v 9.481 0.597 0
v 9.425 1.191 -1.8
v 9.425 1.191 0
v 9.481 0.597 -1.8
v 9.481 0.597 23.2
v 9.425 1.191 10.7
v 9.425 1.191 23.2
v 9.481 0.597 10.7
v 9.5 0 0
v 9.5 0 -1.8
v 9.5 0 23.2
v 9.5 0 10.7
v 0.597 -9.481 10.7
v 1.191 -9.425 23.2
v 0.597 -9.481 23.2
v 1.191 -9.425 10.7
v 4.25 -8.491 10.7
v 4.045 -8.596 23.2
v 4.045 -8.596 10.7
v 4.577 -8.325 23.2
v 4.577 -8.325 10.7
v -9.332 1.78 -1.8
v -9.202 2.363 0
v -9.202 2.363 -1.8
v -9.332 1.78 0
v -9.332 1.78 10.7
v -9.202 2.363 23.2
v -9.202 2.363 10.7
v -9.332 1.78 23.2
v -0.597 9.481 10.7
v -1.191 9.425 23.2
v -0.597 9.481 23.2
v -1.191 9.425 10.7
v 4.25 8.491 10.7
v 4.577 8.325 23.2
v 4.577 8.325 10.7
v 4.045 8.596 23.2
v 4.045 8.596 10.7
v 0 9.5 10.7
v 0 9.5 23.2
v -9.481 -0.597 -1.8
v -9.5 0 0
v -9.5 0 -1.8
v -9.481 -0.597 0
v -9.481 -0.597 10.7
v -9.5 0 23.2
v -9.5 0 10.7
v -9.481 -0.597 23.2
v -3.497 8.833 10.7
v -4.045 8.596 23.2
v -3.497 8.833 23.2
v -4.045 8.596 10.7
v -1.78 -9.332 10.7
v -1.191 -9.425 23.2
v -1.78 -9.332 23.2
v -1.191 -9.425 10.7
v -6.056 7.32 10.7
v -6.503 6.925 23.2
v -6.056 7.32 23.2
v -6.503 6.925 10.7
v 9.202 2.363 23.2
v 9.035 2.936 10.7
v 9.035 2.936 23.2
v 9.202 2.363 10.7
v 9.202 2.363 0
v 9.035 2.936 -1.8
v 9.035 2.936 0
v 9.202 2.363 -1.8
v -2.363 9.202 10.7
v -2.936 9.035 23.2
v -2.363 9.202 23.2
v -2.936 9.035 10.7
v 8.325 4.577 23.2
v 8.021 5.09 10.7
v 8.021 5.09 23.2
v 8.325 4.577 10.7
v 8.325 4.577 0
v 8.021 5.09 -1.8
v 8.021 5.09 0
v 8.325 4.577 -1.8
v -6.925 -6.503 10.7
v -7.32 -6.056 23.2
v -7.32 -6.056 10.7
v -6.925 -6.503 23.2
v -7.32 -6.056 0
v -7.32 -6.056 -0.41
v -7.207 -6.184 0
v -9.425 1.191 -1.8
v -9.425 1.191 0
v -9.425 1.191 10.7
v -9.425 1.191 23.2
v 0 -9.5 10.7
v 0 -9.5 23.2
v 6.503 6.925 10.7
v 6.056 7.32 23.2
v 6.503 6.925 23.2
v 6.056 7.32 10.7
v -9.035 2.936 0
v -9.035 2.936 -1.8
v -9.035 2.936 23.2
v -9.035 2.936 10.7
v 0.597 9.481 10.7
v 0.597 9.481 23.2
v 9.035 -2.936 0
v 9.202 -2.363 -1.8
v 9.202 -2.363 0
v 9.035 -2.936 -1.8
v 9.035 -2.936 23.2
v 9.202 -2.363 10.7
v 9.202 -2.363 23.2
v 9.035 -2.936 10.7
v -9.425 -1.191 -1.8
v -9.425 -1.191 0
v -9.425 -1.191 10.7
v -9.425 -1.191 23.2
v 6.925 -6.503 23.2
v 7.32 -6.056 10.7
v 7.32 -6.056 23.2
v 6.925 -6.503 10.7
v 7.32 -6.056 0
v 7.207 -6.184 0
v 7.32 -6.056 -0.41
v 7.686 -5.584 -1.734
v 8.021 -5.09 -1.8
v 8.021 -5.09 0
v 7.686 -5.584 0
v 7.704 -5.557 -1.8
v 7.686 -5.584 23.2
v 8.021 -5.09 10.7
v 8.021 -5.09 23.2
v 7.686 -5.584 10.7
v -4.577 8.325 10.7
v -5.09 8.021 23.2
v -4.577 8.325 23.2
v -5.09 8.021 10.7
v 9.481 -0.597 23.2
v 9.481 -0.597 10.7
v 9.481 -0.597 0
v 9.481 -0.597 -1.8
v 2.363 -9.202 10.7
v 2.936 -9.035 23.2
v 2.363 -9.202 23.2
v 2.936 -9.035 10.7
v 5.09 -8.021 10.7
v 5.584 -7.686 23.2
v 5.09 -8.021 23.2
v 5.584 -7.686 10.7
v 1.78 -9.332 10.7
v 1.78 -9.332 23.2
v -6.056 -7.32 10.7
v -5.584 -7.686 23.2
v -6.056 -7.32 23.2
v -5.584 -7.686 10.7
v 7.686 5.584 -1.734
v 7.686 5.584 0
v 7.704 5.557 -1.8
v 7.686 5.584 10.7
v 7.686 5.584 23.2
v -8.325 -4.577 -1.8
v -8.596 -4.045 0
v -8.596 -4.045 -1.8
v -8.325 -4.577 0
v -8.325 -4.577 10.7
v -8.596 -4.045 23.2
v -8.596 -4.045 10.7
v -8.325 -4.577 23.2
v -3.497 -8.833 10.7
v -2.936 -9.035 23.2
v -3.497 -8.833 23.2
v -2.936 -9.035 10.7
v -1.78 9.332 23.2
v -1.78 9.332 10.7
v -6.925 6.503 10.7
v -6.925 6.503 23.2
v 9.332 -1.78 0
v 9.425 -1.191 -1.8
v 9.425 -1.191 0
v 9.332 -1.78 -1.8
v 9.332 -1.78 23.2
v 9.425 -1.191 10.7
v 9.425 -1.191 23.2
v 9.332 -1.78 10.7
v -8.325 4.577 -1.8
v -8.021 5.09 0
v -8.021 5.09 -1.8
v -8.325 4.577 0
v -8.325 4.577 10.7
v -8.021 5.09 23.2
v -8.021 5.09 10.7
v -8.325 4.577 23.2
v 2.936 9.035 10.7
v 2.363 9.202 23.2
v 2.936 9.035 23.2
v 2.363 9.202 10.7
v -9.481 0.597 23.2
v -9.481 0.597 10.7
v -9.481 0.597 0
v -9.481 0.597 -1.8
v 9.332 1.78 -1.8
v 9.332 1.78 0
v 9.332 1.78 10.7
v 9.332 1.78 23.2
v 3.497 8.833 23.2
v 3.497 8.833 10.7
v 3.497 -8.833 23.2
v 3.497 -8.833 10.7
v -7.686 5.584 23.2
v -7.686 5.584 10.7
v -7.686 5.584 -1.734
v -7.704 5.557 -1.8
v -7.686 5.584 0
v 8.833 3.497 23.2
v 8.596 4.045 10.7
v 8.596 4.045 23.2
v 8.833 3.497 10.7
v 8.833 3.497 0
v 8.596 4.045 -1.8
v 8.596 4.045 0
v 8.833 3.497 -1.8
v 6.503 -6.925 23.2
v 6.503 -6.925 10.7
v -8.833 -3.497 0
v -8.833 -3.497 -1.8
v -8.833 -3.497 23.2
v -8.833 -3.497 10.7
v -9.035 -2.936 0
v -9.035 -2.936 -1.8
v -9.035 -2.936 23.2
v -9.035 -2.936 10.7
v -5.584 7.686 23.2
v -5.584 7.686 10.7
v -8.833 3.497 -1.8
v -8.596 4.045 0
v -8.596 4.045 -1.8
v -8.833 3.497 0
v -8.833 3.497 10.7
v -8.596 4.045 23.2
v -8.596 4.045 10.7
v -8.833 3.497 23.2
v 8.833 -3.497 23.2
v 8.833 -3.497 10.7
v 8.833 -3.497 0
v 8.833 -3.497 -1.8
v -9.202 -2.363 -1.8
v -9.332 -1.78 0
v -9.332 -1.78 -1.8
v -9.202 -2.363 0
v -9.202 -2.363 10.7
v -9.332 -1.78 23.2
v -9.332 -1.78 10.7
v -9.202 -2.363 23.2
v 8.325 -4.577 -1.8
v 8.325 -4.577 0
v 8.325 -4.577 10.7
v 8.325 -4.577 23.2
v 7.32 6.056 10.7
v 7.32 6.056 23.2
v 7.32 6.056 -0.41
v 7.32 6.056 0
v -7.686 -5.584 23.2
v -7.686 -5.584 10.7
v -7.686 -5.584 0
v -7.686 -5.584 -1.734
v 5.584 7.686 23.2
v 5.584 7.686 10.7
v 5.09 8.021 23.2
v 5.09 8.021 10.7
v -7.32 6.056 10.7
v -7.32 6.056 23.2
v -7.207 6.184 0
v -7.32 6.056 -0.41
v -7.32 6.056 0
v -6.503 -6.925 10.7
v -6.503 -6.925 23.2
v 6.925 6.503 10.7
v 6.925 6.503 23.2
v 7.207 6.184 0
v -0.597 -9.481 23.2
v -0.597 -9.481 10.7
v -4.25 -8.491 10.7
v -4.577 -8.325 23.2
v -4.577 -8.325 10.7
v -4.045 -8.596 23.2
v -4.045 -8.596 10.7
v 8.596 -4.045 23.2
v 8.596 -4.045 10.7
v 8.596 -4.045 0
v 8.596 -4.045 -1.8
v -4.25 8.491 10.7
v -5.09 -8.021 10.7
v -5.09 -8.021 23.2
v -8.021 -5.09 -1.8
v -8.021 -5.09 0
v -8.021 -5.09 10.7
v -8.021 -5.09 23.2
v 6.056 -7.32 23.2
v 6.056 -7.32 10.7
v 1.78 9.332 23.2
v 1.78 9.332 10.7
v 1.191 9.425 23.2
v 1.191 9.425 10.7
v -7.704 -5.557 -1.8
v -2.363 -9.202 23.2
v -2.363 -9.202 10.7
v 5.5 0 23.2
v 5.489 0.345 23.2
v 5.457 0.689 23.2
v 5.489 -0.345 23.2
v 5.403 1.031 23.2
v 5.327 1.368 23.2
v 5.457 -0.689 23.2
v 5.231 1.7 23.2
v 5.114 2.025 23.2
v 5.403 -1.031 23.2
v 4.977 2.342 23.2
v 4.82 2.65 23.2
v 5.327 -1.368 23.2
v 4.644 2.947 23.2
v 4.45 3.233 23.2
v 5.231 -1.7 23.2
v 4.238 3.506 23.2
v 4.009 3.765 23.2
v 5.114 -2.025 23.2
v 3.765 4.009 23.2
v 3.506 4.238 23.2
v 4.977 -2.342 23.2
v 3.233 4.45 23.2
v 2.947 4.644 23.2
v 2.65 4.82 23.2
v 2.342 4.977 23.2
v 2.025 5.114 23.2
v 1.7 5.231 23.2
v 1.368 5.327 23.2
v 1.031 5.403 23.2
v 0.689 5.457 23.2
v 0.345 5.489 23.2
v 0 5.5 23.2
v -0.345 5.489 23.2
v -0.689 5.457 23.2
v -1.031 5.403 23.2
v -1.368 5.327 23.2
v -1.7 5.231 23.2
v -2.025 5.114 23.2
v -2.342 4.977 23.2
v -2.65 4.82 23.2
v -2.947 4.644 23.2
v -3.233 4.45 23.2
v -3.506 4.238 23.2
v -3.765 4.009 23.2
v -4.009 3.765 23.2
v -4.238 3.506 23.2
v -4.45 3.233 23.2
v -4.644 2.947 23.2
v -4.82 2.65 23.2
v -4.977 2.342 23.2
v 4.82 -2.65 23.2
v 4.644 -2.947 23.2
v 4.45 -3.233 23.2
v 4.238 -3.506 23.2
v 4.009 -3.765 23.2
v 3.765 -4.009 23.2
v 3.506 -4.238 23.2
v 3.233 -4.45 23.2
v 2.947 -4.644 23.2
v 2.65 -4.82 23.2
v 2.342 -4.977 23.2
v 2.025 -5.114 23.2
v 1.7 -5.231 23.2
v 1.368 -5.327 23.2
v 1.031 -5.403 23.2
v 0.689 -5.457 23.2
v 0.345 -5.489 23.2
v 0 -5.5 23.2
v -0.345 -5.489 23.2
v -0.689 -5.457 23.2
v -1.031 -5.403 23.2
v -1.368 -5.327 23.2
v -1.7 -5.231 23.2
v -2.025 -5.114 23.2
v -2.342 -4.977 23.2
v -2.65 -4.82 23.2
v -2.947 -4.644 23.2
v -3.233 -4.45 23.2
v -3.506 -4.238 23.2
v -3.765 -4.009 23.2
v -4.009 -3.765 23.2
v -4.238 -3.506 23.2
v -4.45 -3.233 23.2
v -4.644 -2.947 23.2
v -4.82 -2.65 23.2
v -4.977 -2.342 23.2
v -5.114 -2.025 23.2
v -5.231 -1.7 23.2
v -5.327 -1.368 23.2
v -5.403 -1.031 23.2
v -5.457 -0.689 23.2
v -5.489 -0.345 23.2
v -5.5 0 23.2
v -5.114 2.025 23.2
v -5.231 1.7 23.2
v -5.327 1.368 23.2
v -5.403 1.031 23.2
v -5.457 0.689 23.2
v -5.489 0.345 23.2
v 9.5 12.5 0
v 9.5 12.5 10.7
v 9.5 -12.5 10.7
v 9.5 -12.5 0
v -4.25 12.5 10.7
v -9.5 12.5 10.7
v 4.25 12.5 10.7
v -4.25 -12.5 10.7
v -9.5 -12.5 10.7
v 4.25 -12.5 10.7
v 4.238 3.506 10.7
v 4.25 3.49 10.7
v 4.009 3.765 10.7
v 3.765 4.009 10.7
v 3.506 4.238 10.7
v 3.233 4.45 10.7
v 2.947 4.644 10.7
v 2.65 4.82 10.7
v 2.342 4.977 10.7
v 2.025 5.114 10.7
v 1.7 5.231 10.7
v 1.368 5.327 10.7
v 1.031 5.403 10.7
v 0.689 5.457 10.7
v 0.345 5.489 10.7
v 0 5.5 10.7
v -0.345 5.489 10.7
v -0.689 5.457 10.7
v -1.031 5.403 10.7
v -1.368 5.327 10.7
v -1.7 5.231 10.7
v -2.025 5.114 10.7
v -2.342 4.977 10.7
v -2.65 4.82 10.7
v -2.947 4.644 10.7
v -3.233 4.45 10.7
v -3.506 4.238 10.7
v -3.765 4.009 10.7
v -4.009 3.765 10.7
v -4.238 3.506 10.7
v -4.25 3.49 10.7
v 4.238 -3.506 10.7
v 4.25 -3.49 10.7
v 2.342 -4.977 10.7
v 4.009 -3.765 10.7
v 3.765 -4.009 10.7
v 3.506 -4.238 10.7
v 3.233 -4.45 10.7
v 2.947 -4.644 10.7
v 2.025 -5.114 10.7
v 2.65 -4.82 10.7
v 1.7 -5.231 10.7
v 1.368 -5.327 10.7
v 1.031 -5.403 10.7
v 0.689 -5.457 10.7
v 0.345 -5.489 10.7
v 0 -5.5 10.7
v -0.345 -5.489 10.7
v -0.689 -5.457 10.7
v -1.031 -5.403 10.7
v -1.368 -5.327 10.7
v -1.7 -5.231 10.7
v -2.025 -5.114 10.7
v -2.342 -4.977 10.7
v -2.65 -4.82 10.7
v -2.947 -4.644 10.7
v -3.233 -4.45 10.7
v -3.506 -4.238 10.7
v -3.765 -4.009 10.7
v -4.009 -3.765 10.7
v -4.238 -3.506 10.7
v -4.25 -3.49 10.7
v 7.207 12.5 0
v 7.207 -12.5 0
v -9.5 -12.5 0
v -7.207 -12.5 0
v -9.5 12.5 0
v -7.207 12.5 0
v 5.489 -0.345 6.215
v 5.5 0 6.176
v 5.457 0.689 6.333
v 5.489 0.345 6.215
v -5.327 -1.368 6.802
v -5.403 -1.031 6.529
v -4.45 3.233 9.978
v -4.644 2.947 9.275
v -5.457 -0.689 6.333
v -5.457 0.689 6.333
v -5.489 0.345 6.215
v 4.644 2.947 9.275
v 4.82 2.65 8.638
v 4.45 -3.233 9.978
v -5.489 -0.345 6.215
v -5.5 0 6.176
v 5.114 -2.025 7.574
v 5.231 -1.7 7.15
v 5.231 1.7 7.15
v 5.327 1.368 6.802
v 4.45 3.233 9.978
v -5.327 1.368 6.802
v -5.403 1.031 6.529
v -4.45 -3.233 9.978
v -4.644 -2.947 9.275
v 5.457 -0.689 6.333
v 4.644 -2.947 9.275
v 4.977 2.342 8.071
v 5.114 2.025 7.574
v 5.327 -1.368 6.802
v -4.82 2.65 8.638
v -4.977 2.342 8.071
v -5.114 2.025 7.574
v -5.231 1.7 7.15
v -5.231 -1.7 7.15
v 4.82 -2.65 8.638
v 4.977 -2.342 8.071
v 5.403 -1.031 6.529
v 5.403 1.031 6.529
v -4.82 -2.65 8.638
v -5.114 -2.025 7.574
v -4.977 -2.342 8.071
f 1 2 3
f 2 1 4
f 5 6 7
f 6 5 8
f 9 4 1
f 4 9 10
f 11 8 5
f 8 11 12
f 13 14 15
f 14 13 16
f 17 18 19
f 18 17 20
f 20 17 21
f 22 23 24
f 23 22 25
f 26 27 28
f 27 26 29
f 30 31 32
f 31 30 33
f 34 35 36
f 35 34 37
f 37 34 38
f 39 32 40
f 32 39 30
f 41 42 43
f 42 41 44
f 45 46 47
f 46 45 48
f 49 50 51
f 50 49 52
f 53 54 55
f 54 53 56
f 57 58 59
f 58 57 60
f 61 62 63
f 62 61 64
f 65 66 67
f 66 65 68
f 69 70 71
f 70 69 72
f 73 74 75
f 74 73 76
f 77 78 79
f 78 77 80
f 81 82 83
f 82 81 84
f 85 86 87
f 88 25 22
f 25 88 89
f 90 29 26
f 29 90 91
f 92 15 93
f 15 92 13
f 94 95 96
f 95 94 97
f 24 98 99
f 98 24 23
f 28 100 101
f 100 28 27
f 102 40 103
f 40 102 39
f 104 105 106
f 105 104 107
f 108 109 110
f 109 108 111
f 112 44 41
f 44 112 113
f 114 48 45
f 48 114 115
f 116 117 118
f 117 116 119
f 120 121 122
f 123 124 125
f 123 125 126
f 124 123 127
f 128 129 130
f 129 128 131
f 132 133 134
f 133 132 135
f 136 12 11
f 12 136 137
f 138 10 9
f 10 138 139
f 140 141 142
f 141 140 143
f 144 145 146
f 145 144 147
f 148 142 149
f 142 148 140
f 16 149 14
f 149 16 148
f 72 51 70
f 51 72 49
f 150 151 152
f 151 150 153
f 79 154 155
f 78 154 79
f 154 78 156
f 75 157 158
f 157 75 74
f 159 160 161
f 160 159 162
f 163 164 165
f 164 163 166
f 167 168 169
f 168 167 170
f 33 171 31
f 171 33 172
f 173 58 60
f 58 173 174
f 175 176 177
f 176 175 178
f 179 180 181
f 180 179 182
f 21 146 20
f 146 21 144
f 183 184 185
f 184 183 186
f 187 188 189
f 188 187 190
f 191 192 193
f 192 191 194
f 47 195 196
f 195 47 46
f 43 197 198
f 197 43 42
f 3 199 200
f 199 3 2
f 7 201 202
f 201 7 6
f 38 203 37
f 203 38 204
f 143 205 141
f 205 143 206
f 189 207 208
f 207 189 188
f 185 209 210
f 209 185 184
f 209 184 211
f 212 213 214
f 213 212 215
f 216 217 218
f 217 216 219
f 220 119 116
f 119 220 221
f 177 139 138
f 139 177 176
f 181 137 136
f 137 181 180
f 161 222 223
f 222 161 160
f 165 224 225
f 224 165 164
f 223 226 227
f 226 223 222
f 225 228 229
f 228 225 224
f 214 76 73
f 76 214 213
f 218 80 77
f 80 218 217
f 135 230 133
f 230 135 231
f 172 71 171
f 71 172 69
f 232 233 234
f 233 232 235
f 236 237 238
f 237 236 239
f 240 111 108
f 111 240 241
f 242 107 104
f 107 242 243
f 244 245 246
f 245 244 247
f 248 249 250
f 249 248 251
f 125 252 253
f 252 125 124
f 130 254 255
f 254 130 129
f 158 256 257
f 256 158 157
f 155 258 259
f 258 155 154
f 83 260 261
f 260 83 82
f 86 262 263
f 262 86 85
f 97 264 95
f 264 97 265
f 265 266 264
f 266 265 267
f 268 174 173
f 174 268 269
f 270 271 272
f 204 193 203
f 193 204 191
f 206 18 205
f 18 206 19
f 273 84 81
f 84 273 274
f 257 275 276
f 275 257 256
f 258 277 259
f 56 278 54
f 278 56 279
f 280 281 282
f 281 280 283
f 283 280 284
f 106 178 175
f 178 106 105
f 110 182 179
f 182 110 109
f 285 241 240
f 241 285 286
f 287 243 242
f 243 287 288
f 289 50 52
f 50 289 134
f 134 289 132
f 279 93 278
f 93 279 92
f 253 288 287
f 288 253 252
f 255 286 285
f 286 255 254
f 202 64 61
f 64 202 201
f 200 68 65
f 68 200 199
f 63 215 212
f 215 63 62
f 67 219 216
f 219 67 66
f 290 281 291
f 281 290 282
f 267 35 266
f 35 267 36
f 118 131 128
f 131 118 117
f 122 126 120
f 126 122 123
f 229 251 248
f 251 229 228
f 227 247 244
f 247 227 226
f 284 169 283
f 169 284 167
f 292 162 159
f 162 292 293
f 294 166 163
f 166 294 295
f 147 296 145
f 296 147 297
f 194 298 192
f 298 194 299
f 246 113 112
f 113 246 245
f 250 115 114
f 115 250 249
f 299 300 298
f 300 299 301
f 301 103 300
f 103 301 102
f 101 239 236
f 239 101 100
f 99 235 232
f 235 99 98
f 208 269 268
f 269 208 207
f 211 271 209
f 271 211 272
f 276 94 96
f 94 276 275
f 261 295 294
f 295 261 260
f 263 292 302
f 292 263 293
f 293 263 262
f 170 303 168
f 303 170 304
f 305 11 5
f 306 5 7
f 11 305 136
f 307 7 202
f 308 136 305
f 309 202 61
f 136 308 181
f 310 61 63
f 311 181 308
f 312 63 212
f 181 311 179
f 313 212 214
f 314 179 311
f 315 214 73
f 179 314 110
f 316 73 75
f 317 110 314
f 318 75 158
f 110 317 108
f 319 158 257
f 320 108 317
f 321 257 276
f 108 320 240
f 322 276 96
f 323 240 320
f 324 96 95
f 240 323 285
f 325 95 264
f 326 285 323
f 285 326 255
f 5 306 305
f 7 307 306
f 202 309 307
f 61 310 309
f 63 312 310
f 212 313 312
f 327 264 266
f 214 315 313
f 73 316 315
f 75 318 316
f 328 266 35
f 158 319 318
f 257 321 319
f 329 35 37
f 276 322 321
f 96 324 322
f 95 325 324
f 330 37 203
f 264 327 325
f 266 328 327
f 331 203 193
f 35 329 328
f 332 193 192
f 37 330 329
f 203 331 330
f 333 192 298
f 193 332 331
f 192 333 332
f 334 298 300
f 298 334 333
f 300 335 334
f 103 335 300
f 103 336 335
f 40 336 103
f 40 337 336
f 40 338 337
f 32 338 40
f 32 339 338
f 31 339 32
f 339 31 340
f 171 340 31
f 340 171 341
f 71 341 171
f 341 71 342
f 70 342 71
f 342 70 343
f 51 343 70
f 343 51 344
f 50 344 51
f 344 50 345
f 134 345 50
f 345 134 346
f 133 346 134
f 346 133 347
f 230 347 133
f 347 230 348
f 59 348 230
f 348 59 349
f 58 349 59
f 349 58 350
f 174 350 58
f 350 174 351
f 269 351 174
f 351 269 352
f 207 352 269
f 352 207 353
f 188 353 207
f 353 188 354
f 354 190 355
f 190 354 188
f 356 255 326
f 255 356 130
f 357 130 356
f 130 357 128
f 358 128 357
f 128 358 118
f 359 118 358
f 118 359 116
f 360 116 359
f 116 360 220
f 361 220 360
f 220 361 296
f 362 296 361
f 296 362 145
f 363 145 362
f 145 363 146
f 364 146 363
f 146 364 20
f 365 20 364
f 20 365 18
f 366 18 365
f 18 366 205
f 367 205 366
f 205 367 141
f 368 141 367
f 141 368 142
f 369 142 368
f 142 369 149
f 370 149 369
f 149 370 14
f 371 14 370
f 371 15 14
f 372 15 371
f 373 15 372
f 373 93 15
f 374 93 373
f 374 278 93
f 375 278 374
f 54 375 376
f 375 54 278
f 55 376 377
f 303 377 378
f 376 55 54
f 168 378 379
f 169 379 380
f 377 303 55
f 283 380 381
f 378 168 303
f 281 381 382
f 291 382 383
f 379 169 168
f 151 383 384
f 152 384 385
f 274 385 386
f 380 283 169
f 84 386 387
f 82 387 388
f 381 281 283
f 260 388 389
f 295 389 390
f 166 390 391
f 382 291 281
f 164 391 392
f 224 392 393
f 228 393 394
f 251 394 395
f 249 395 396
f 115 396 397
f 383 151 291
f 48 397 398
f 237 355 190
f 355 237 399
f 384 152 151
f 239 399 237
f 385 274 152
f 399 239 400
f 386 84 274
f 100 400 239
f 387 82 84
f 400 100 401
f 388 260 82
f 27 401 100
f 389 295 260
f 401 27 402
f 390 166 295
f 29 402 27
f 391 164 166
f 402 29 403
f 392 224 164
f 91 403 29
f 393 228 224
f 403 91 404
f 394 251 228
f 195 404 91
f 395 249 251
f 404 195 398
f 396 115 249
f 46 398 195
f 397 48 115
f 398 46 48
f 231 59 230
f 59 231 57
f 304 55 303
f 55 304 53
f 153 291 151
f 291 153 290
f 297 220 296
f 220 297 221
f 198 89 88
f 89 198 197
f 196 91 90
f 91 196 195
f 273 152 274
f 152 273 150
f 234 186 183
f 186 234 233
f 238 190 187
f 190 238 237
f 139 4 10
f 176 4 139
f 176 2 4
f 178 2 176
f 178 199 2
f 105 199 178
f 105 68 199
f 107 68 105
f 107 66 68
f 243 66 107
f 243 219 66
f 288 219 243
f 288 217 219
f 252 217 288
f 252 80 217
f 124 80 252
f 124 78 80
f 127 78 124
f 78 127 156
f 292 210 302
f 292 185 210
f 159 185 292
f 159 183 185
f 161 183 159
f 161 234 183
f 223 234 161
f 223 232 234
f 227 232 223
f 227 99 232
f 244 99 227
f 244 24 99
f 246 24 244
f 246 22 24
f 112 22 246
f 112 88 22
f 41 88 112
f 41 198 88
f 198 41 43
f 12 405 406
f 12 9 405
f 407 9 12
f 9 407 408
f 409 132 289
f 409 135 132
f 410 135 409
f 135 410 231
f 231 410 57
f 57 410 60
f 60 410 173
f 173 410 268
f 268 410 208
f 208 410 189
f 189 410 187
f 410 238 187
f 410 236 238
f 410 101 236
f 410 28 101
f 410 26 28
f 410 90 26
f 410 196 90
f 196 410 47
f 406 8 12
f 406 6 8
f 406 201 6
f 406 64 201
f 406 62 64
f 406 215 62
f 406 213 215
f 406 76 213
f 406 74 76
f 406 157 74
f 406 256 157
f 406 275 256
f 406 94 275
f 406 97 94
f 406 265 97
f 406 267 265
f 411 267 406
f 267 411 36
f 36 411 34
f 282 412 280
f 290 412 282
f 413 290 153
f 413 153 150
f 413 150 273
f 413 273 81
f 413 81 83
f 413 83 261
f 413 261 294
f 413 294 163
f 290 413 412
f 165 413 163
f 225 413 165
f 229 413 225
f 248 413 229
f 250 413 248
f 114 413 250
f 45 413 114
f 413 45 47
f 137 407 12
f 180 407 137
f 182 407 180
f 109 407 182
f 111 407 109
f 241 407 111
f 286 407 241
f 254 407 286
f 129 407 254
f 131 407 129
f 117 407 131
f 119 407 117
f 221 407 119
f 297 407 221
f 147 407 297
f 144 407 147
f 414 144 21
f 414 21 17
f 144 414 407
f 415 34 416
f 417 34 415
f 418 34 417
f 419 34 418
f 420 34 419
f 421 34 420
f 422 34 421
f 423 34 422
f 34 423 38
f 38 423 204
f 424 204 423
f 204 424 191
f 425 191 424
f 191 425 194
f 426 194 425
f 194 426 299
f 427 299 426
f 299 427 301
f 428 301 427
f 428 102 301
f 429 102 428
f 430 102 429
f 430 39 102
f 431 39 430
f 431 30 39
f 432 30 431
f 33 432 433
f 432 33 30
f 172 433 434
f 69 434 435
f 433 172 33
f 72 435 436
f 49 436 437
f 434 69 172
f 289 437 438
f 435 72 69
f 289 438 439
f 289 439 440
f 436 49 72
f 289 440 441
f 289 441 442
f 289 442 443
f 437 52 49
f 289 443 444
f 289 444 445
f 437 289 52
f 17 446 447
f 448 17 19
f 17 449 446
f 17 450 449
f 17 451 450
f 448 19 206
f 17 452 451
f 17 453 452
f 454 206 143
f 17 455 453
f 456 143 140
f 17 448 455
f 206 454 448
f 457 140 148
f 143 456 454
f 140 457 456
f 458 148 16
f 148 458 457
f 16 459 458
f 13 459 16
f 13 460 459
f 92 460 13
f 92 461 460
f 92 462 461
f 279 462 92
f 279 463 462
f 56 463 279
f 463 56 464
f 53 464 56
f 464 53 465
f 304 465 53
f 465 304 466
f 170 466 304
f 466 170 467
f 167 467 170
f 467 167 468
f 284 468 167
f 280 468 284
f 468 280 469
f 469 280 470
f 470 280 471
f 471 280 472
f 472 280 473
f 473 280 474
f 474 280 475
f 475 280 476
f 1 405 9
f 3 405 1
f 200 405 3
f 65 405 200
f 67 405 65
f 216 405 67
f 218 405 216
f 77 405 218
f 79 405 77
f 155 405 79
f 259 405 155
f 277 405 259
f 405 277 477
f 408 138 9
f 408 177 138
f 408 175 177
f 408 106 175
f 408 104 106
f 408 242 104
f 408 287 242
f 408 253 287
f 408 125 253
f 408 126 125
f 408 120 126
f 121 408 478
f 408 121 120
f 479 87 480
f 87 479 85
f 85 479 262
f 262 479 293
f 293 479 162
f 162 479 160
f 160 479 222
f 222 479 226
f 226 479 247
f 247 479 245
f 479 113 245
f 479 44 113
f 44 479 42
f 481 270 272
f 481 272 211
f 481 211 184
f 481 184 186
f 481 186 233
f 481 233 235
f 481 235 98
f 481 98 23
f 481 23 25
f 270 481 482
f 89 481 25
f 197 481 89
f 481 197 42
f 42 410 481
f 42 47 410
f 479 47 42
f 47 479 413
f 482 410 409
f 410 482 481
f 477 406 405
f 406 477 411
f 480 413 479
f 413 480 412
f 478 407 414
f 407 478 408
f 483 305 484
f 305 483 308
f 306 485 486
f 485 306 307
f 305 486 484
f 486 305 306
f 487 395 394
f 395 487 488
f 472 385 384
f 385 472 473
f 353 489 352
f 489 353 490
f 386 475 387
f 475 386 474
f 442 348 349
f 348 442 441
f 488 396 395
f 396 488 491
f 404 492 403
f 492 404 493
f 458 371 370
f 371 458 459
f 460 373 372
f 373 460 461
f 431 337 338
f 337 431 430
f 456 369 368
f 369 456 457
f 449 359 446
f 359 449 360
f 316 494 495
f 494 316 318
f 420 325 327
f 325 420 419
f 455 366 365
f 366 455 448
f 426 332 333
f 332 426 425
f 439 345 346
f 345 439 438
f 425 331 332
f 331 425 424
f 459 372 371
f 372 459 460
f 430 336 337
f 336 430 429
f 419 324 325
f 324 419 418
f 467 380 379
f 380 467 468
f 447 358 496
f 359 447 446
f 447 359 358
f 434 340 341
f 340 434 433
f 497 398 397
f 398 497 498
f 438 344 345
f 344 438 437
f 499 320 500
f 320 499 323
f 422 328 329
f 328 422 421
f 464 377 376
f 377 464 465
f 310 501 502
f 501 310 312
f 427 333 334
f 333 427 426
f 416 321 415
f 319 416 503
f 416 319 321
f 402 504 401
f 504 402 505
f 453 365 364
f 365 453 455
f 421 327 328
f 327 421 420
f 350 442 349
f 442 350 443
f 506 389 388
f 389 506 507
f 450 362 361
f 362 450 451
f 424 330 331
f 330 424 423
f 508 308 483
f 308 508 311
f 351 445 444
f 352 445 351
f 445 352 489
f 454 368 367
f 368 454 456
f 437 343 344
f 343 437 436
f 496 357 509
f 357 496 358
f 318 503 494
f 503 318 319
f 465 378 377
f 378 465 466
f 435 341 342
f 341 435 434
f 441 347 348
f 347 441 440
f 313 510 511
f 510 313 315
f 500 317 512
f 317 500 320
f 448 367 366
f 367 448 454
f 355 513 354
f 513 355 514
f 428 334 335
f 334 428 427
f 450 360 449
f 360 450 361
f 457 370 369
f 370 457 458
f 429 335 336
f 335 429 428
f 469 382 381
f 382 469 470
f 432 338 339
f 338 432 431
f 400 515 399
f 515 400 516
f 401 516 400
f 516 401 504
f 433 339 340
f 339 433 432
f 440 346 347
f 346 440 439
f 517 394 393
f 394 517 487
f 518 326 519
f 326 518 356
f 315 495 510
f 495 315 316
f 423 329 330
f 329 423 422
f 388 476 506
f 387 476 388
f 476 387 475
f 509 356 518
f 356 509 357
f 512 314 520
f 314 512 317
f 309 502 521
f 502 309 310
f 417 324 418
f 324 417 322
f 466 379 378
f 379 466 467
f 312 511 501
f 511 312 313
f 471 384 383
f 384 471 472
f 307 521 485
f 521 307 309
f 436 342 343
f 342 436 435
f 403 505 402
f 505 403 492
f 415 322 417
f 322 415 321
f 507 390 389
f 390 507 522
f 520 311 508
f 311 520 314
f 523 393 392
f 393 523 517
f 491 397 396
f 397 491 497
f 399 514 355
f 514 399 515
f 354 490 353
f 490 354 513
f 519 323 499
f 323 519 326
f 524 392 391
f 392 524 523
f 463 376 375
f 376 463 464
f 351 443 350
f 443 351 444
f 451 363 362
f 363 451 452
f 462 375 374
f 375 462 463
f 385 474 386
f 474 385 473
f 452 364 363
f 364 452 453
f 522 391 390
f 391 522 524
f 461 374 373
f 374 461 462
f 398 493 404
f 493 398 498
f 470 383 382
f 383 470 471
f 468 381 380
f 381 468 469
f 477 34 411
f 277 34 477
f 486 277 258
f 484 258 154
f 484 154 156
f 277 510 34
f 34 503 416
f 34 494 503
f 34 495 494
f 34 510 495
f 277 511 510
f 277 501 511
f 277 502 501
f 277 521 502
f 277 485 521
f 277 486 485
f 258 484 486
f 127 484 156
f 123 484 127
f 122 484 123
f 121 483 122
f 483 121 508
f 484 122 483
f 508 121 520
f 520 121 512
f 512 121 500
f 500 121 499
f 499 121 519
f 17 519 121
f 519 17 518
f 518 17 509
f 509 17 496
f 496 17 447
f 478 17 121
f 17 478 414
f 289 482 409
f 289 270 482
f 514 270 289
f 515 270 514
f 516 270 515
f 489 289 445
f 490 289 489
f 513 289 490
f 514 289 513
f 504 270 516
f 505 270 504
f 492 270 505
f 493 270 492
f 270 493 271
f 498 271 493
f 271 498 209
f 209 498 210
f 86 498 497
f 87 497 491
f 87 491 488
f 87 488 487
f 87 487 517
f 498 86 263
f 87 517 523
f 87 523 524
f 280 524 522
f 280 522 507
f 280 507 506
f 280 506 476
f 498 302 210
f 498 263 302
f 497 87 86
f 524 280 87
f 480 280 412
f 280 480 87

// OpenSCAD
/*
  TPU Snap-Fit Screwdriver Holder (Magnetic)
  Optimized for the "neck" of the LTT Screwdriver.
*/

$fn = 100;

// --- Parameters ---
shaft_diameter = 11.0;      // Diameter of the screwdriver neck/shaft
snap_opening = 8.5;         // Narrowest part of the opening (must be < shaft to hold it)
holder_height = 25.0;       // Length of the holder (Y-axis)
wall_thickness = 4.0;       // Thickness of the flexible TPU arms

magnet_diameter = 10.2;     // Magnet diameter (includes ~0.2mm clearance)
magnet_thickness = 3.2;     // Magnet depth (includes ~0.2mm clearance)

// --- Calculated Values ---
outer_diameter = shaft_diameter + (wall_thickness * 2);
backplate_width = outer_diameter;
// Ensure there is 2mm of solid TPU separating the magnet from the screwdriver
backplate_thickness = magnet_thickness + 2.0;

module tpu_screwdriver_holder() {
    difference() {
        // --- MAIN SOLID BODY ---
        union() {
            // The outer round part of the C-clamp
            translate([0, 0, backplate_thickness + (shaft_diameter / 2)])
                cylinder(h=holder_height, d=outer_diameter, center=true);

            // The solid back block connecting the cylinder to the flat backplate
            translate([0, 0, (backplate_thickness + (shaft_diameter / 2)) / 2])
                cube([backplate_width, holder_height, backplate_thickness + (shaft_diameter / 2)], center=true);
        }

        // --- CUTOUTS (The negative space) ---

        // 1. Screwdriver Shaft Rest
        translate([0, 0, backplate_thickness + (shaft_diameter / 2)])
            cylinder(h=holder_height + 2, d=shaft_diameter, center=true);

        // 2. Flared Entry Channel (V-Cut for easier push-in)
        translate([0, -(holder_height + 2) / 2, backplate_thickness + (shaft_diameter / 2)])
            rotate([-90, 0, 0]) // Orient polygon to cut upward along Z, extruded across Y
            linear_extrude(height=holder_height + 2)
            polygon([
                [-snap_opening / 2, 0],
                [snap_opening / 2, 0],
                [outer_diameter / 2, outer_diameter],
                [-outer_diameter / 2, outer_diameter]
            ]);

        // 3. Top Magnet Hole
        // Positioned at the back (Z=0), cutting upward into the backplate
        translate([0, holder_height / 4, magnet_thickness / 2 - 0.1])
            cylinder(h=magnet_thickness + 0.2, d=magnet_diameter, center=true);

        // 4. Bottom Magnet Hole
        translate([0, -holder_height / 4, magnet_thickness / 2 - 0.1])
            cylinder(h=magnet_thickness + 0.2, d=magnet_diameter, center=true);
    }
}

// Render the final object
tpu_screwdriver_holder();
